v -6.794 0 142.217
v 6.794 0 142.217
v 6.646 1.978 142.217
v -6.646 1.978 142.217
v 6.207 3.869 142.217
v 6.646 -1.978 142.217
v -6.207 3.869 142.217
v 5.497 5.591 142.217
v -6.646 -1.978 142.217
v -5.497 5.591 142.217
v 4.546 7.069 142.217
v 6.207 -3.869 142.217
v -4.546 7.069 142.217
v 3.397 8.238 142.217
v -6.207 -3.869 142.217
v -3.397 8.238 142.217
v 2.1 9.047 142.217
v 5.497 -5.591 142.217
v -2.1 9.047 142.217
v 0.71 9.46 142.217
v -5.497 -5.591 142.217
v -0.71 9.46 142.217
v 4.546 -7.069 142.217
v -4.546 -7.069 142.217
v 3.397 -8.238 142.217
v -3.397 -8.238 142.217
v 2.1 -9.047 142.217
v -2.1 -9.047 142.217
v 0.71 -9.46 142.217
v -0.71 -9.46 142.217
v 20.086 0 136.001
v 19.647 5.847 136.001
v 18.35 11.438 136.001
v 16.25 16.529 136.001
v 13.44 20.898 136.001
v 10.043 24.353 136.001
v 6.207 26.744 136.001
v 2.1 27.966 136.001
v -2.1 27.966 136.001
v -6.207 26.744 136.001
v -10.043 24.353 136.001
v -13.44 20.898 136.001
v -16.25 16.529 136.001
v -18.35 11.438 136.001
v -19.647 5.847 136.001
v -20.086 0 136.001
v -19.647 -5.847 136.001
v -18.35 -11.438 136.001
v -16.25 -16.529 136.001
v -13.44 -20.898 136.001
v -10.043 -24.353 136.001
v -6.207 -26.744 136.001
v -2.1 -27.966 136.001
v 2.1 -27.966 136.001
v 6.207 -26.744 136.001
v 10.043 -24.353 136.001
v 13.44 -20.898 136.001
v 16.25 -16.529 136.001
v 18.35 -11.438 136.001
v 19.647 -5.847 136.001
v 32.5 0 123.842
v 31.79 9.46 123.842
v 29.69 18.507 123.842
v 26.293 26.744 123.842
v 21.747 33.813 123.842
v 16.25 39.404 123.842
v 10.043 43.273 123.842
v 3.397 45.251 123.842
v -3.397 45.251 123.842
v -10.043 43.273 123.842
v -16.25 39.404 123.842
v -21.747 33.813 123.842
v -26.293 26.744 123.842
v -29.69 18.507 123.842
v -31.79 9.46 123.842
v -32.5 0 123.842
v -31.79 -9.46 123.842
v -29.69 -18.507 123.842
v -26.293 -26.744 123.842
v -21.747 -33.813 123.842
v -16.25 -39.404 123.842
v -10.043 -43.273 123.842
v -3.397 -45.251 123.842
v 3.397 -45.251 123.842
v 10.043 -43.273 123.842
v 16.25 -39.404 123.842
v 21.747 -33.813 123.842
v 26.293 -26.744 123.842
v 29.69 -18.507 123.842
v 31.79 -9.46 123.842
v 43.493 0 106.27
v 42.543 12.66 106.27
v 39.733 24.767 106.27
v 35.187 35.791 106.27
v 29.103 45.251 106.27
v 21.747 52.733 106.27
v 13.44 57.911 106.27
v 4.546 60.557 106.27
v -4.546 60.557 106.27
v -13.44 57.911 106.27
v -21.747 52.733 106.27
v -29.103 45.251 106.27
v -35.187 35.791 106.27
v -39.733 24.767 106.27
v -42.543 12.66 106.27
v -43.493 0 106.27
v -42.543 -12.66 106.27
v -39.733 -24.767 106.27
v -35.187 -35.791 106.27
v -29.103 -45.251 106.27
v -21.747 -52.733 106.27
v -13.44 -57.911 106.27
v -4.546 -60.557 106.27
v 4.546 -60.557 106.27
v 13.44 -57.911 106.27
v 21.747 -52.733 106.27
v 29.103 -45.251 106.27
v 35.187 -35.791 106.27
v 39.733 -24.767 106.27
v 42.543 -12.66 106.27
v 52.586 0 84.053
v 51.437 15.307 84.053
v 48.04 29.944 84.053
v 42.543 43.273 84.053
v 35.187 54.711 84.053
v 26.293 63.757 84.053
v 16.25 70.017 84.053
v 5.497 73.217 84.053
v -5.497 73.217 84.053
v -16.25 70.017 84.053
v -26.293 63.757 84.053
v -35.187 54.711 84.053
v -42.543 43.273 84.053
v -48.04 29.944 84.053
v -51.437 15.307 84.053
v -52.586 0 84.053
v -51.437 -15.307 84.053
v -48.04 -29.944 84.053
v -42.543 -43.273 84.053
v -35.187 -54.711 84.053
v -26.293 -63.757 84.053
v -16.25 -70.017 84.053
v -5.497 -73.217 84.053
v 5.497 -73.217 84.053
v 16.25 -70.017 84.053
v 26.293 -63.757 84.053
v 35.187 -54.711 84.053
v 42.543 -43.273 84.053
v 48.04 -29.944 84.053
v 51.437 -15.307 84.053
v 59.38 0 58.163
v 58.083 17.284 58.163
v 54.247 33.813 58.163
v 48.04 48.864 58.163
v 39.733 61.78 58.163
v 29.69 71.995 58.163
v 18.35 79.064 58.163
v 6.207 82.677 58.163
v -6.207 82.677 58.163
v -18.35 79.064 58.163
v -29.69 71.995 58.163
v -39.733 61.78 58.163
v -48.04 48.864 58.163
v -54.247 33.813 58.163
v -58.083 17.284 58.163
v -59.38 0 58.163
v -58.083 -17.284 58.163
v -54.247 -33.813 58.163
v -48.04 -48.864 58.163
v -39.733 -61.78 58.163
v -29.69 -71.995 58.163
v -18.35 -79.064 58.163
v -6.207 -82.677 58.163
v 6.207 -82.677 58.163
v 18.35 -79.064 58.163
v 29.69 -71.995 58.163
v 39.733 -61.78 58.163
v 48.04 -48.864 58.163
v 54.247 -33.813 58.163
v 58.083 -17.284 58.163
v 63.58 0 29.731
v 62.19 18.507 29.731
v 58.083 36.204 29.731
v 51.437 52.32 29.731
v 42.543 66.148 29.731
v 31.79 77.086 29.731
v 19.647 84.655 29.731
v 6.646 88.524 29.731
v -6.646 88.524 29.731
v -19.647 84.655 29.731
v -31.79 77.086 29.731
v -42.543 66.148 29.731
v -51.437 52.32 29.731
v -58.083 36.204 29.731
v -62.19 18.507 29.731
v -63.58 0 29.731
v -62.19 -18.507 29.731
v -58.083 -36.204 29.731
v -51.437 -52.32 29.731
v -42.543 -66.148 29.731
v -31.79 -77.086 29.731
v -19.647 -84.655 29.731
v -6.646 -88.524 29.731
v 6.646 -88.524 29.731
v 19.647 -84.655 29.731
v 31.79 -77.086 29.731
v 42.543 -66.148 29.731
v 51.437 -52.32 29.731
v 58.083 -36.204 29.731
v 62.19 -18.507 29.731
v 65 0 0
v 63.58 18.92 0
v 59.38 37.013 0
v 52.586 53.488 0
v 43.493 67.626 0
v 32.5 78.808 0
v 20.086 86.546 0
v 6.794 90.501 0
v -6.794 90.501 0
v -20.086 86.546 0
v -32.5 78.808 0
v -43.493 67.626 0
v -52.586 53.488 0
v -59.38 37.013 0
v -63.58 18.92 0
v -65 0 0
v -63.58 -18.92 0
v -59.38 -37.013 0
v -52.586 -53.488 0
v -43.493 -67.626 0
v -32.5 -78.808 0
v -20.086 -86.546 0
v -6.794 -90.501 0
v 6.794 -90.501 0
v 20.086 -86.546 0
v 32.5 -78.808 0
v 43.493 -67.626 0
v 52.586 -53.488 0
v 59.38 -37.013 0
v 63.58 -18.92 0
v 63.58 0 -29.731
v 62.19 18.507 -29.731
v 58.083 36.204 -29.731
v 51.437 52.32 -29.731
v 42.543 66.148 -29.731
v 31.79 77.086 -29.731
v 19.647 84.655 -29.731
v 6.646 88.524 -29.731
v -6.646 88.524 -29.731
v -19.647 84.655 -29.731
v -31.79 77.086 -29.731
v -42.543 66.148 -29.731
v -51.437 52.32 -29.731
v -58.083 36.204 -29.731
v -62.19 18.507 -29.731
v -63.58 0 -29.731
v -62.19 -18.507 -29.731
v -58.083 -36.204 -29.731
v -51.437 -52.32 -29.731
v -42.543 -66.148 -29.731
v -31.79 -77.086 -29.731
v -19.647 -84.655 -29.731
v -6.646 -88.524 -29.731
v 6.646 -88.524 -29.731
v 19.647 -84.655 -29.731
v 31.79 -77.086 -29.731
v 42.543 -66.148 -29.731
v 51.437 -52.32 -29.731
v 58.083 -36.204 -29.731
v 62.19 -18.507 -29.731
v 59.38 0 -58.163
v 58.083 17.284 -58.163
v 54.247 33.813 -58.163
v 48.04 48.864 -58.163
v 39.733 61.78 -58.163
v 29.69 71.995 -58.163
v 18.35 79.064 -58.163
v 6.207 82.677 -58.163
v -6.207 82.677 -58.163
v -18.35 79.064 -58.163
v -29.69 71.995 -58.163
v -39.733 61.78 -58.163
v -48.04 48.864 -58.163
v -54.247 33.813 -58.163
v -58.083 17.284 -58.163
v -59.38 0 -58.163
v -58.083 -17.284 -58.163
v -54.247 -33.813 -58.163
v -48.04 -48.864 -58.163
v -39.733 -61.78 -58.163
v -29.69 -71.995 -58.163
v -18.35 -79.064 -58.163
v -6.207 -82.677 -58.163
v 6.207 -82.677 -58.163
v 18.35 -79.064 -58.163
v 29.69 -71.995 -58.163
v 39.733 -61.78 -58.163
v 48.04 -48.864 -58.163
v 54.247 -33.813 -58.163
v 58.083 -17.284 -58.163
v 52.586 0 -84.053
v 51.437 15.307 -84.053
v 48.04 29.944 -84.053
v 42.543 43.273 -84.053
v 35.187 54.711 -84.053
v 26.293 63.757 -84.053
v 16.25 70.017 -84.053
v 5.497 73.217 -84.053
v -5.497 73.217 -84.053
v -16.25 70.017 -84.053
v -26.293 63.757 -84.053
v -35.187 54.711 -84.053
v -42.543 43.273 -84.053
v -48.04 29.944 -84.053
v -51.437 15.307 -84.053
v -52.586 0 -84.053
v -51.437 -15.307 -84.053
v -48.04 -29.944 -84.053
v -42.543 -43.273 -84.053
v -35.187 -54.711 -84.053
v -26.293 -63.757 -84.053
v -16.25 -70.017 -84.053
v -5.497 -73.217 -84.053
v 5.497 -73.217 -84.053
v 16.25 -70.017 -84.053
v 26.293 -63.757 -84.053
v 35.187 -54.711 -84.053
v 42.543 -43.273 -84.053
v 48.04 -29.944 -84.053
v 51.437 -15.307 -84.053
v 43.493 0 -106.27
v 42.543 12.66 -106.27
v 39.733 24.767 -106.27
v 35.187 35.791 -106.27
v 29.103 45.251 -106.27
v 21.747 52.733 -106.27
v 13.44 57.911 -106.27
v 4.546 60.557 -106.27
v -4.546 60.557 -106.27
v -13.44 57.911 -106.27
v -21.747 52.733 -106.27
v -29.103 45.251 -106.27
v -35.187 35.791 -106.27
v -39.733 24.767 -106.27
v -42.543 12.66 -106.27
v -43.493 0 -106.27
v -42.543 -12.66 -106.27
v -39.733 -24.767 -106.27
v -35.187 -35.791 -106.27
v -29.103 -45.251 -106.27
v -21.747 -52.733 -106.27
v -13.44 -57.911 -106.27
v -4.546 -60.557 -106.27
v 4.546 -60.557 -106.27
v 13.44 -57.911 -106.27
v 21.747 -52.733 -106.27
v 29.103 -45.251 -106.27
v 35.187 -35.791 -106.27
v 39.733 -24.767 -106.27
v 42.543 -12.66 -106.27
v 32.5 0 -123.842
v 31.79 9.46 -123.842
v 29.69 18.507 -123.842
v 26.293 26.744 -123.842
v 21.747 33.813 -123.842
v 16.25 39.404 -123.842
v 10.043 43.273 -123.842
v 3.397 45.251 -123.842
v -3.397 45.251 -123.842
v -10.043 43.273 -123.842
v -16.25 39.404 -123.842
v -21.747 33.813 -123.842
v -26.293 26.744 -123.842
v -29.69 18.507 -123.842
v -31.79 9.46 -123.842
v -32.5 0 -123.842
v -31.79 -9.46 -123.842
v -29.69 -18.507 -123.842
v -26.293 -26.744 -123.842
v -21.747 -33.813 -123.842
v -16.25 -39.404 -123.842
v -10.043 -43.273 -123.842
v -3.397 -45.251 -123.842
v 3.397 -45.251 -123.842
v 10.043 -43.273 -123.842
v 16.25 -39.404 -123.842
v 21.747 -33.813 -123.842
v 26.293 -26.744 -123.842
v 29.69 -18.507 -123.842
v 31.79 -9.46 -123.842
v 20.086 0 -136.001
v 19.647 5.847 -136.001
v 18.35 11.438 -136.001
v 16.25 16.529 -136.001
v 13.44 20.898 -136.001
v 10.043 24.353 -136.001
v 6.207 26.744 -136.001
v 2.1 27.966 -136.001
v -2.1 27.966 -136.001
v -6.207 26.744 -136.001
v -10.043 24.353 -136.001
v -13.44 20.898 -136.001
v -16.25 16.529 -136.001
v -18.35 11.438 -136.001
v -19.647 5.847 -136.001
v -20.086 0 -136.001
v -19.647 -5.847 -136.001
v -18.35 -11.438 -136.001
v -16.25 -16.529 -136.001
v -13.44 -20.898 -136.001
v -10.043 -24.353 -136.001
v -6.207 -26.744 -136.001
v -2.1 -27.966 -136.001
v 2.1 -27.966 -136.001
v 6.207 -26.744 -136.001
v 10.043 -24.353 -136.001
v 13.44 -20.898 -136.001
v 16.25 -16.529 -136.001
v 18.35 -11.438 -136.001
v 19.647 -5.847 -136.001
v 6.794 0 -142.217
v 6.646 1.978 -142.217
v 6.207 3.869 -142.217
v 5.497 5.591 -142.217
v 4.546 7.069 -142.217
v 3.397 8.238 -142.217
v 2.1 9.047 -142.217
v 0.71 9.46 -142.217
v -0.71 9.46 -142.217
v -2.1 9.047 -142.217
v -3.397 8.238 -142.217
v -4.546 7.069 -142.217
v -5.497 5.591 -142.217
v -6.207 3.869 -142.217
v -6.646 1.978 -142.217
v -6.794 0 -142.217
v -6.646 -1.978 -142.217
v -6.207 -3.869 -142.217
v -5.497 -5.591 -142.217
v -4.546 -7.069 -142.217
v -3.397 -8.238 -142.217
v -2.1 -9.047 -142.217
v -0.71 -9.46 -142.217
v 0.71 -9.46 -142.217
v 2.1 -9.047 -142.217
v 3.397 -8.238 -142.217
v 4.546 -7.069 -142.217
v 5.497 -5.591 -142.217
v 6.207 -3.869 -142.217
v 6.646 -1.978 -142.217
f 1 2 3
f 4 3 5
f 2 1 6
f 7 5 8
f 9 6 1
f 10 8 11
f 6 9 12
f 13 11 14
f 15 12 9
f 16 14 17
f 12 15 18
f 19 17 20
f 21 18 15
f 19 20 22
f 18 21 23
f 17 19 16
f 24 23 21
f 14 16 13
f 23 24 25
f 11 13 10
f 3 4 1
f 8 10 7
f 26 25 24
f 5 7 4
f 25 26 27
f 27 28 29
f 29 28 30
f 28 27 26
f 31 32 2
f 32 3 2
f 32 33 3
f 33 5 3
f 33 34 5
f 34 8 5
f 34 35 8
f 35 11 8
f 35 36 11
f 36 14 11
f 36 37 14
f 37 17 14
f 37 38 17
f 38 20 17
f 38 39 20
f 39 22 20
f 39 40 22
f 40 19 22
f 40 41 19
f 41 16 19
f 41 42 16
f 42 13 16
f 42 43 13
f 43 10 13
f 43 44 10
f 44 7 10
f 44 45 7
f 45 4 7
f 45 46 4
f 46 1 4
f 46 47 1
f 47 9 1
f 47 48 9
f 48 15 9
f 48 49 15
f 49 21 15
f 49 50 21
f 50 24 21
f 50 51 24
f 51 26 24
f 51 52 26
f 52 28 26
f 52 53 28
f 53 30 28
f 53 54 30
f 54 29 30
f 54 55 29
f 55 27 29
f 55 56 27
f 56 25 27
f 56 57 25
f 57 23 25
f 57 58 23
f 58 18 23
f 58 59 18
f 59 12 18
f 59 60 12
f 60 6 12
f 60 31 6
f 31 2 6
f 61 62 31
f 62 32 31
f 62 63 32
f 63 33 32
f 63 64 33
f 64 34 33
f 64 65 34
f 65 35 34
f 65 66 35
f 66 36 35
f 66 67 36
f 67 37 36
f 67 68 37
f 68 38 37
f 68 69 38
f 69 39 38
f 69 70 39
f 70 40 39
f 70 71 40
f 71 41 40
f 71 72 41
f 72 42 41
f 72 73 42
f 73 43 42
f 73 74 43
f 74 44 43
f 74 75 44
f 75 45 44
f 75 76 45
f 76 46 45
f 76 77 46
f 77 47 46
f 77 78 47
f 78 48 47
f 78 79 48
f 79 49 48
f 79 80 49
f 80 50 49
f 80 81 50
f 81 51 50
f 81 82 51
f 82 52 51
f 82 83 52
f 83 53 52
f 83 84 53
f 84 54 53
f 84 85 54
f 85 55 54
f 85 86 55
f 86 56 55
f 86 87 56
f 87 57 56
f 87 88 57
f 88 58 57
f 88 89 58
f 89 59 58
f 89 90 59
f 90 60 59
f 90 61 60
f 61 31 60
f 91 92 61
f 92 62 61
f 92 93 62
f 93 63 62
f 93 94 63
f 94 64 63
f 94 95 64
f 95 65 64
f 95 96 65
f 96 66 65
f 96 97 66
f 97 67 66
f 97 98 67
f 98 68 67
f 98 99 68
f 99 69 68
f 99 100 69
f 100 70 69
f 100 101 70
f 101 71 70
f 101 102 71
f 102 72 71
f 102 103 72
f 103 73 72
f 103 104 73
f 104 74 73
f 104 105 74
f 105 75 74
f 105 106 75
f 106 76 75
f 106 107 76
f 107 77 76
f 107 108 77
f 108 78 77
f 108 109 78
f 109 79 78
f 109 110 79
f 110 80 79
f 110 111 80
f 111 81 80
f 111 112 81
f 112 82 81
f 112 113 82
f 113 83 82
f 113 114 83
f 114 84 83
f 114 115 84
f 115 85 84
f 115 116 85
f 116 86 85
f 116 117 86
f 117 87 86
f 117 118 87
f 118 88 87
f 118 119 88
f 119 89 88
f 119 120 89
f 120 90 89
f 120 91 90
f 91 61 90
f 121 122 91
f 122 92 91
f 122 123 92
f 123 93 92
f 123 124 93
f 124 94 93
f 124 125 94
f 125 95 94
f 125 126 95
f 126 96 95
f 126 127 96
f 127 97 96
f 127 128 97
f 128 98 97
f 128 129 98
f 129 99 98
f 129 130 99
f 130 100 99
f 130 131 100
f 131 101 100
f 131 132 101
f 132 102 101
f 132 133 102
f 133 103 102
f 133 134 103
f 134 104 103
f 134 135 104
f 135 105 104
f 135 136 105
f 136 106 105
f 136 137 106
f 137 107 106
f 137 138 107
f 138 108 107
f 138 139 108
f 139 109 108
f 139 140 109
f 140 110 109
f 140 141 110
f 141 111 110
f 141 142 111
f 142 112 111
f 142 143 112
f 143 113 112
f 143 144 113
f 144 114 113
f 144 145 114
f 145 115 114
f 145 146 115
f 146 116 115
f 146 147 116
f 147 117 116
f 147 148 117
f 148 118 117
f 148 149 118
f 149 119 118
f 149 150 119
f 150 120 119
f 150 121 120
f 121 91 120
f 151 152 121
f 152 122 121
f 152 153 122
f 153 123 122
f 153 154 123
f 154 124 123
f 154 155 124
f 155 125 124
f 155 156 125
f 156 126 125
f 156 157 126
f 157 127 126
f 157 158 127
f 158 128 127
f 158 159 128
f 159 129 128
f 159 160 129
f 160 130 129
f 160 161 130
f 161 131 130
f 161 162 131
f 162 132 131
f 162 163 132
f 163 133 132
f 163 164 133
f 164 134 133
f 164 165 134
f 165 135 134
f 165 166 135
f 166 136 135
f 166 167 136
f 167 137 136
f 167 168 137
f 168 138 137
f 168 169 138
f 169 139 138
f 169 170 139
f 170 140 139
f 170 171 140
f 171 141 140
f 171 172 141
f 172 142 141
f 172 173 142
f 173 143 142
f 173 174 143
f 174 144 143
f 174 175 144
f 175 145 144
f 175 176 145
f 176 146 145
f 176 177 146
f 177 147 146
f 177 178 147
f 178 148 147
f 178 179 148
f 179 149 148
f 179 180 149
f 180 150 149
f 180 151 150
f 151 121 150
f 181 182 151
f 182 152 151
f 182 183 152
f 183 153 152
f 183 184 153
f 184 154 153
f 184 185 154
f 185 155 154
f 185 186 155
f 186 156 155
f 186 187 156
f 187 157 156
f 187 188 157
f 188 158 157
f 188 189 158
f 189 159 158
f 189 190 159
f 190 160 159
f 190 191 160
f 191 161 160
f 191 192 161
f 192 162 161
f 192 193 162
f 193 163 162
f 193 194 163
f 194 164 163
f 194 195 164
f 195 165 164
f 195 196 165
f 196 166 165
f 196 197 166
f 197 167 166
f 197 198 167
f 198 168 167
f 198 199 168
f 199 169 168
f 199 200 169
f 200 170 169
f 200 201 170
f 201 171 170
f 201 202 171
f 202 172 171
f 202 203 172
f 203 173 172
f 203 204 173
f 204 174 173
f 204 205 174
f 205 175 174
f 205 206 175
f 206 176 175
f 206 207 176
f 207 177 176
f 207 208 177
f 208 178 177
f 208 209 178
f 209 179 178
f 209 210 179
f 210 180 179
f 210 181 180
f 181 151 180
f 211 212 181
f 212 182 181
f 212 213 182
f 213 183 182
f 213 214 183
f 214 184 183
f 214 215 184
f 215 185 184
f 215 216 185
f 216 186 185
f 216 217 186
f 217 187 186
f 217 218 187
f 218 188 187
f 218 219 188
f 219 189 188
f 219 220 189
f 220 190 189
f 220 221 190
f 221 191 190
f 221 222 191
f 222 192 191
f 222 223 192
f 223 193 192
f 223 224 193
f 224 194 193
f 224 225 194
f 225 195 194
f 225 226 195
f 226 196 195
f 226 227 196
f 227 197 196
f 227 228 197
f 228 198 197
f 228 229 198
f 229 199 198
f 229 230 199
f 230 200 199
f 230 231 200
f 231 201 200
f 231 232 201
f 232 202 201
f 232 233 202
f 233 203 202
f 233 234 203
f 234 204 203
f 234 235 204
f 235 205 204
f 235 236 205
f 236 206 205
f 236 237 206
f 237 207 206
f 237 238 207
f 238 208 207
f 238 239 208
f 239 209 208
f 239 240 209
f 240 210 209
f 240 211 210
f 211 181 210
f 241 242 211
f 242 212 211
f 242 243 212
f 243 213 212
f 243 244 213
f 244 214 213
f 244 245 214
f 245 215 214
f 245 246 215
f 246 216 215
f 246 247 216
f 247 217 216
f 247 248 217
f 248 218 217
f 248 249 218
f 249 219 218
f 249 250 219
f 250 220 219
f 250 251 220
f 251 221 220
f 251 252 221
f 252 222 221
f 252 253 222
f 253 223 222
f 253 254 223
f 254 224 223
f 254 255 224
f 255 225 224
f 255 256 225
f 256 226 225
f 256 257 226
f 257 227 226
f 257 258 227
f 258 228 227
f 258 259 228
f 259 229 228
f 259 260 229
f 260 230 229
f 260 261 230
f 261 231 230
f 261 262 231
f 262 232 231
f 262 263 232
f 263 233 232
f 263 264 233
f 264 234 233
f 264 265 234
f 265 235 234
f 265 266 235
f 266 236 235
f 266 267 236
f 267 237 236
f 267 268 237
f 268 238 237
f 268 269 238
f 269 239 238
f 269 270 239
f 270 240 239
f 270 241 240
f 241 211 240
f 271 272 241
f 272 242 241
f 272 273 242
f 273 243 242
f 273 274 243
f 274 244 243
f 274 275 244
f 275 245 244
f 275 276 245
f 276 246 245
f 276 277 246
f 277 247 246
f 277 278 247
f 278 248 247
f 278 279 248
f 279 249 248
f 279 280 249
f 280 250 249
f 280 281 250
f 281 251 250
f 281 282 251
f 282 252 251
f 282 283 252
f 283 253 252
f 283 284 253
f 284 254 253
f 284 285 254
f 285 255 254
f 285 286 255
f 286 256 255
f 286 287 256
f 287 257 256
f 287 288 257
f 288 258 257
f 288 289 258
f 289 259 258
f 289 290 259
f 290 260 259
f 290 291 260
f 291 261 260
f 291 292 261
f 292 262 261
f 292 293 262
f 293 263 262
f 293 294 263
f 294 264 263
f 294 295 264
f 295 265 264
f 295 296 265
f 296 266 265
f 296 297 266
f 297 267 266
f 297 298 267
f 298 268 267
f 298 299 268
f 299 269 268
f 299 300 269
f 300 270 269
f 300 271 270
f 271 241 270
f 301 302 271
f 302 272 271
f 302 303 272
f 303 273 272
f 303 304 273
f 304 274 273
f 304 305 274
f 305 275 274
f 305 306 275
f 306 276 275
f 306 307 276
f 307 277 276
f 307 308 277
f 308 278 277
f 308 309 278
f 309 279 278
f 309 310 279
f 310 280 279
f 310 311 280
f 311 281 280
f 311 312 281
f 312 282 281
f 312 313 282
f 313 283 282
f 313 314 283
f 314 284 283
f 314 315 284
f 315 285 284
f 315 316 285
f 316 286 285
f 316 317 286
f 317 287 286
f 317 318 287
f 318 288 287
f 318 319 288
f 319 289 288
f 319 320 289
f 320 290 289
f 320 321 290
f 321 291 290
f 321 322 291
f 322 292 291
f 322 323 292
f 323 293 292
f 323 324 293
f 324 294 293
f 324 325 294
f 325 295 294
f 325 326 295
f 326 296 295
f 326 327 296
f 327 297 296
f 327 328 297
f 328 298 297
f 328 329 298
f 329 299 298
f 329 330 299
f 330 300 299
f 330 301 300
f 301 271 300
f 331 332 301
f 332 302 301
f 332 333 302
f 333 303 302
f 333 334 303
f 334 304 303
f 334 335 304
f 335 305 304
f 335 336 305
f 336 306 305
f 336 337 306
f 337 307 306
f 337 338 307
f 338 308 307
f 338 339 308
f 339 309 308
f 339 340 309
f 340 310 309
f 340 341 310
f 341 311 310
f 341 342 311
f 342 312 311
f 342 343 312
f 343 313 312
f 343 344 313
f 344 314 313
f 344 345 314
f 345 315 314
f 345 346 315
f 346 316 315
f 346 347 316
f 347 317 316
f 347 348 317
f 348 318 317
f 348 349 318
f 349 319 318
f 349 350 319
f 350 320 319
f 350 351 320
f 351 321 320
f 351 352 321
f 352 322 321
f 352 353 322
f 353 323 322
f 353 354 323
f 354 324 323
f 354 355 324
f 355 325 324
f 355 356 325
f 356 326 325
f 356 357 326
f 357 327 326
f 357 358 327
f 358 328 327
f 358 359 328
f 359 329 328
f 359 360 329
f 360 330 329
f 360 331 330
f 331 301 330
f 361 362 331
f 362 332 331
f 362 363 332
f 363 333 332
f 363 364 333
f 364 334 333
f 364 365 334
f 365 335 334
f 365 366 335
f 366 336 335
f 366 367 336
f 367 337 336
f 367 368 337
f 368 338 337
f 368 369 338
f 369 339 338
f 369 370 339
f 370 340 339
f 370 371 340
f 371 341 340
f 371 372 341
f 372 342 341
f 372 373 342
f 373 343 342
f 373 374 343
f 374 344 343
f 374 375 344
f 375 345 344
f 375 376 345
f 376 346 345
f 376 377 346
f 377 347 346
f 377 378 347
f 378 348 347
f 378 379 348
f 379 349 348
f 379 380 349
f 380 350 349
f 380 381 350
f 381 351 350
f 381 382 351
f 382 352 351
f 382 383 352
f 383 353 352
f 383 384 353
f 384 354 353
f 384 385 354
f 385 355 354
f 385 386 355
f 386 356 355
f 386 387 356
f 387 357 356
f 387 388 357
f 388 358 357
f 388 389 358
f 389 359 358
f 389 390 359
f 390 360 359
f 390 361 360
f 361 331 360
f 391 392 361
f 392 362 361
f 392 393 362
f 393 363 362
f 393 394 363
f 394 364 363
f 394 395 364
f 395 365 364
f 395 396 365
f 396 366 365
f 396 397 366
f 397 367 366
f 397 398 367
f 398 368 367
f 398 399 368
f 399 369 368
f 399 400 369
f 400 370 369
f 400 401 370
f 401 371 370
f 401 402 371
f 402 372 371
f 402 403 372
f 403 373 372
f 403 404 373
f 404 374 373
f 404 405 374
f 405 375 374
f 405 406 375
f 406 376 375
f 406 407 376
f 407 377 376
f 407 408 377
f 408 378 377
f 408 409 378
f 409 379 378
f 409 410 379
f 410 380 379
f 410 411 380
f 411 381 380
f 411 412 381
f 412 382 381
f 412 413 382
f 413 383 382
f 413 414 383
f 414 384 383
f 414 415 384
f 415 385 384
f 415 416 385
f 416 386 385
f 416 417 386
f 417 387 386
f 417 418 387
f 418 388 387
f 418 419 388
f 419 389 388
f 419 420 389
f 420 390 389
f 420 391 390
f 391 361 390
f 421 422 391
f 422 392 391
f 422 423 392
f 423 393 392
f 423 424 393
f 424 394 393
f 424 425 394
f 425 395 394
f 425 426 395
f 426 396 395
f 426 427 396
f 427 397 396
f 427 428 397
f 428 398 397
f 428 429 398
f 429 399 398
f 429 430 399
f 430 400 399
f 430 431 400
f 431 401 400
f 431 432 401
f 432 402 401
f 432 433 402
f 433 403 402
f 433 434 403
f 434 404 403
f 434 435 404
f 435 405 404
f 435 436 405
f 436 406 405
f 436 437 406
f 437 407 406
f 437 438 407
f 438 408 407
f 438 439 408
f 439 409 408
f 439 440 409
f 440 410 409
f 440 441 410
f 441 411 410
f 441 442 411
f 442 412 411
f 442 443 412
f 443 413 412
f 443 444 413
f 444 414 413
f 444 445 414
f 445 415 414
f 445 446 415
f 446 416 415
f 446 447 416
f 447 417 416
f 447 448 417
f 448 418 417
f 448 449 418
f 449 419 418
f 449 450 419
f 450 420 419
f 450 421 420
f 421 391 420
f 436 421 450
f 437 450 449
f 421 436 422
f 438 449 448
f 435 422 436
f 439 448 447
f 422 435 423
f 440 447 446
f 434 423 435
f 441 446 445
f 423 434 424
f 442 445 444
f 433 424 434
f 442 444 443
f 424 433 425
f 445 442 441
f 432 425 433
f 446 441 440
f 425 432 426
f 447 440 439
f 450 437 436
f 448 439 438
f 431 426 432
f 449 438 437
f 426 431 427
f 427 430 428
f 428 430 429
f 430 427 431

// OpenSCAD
// Generated by SolidPython 1.0.1 on 2020-07-29 00:39:26


scale(v = [5, 7, 11]) {
	sphere(r = 13);
}
/***********************************************
*********      SolidPython code:      **********
************************************************
 
# import packages: SolidPython
from solid import *
from solid.utils import *
from itertools import chain, combinations


class Resize:

    def __init__(self, scad_file):
        self.scad_file = scad_file
        #self.scad_file = import_scad(scad_file)
        # cone/cylinder param:
        self.r1 = 0
        self.r2 = 0
        self.h = 0
        # rectangular prism param:
        self.w = 0
        self.l = 0
        # ellipse param:
        self.r = 0

    # import OpenScad code (file name corresponds to shape)


    # classify shape + parameters
    def assign(self, param1, param2, param3):
        if self.scad_file == 'cone.scad':
            self.r1 = param1
            self.r2 = param2
            self.h = param3
        elif self.scad_file == 'cylinder.scad':
            self.r1 = param1
            self.r2 = param2
            self.h = param3
        elif self.scad_file == 'rectangularPrism.scad':
            self.h = param1
            self.l = param2
            self.w = param3
        else:
            self.r = param1
            self.h = param2

    # resize parameters
    def iterate(self):
        x = range(3, 20, 2)
        i = 1
        if self.scad_file == 'cone.scad':
            tempList = list(combinations(x, 2))
            for temp in tempList:
                param1 = temp[0]
                param2 = temp[1]
                filepath = 'produced_scad_files/' + 'cone' + str(param1) + '_' + str(param2) + '_' + '.scad'
                scad_render_to_file(cylinder(h=param1, r1=param2, r2=0), filepath)

        elif self.scad_file == 'cylinder.scad':
            tempList = list(combinations(x, 3))
            for temp in tempList:
                param1 = temp[0]
                param2 = temp[1]
                filepath = 'produced_scad_files/' + 'cylinder' + str(param1) + '_' + str(param2) + '_' + '.scad'
                scad_render_to_file(cylinder(h=param1, r1=param2, r2=param2), filepath)

        elif self.scad_file == 'rectangularPrism.scad':
            tempList = list(combinations(x, 3))
            for temp in tempList:
                param1 = temp[0]
                param2 = temp[1]
                param3 = temp[2]
                filepath = 'produced_scad_files/' + 'rectangularPrism' + str(param1) + '_' + str(param2) + '_' + str(
                    param3) + '.scad'
                scad_render_to_file(cube(size=(param1, param2, param3)), filepath)

        elif self.scad_file == 'ellipse.scad':
            tempList = list(combinations(x, 4))
            for temp in tempList:
                param1 = temp[0]
                param2 = temp[1]
                param3 = temp[2]
                param4 = temp[3]
                filepath = 'produced_scad_files/' + 'ellipse' + str(param1) + '_' + str(param2) + '_' + str(param3) + '_' + str(param4) + '.scad'
                scad_render_to_file(scale([param1, param2, param3])(sphere(r=param4)), filepath)

    def render_to_scadfile(self):
        scad_render_to_file(scad, 'example.scad') 
 
************************************************/
